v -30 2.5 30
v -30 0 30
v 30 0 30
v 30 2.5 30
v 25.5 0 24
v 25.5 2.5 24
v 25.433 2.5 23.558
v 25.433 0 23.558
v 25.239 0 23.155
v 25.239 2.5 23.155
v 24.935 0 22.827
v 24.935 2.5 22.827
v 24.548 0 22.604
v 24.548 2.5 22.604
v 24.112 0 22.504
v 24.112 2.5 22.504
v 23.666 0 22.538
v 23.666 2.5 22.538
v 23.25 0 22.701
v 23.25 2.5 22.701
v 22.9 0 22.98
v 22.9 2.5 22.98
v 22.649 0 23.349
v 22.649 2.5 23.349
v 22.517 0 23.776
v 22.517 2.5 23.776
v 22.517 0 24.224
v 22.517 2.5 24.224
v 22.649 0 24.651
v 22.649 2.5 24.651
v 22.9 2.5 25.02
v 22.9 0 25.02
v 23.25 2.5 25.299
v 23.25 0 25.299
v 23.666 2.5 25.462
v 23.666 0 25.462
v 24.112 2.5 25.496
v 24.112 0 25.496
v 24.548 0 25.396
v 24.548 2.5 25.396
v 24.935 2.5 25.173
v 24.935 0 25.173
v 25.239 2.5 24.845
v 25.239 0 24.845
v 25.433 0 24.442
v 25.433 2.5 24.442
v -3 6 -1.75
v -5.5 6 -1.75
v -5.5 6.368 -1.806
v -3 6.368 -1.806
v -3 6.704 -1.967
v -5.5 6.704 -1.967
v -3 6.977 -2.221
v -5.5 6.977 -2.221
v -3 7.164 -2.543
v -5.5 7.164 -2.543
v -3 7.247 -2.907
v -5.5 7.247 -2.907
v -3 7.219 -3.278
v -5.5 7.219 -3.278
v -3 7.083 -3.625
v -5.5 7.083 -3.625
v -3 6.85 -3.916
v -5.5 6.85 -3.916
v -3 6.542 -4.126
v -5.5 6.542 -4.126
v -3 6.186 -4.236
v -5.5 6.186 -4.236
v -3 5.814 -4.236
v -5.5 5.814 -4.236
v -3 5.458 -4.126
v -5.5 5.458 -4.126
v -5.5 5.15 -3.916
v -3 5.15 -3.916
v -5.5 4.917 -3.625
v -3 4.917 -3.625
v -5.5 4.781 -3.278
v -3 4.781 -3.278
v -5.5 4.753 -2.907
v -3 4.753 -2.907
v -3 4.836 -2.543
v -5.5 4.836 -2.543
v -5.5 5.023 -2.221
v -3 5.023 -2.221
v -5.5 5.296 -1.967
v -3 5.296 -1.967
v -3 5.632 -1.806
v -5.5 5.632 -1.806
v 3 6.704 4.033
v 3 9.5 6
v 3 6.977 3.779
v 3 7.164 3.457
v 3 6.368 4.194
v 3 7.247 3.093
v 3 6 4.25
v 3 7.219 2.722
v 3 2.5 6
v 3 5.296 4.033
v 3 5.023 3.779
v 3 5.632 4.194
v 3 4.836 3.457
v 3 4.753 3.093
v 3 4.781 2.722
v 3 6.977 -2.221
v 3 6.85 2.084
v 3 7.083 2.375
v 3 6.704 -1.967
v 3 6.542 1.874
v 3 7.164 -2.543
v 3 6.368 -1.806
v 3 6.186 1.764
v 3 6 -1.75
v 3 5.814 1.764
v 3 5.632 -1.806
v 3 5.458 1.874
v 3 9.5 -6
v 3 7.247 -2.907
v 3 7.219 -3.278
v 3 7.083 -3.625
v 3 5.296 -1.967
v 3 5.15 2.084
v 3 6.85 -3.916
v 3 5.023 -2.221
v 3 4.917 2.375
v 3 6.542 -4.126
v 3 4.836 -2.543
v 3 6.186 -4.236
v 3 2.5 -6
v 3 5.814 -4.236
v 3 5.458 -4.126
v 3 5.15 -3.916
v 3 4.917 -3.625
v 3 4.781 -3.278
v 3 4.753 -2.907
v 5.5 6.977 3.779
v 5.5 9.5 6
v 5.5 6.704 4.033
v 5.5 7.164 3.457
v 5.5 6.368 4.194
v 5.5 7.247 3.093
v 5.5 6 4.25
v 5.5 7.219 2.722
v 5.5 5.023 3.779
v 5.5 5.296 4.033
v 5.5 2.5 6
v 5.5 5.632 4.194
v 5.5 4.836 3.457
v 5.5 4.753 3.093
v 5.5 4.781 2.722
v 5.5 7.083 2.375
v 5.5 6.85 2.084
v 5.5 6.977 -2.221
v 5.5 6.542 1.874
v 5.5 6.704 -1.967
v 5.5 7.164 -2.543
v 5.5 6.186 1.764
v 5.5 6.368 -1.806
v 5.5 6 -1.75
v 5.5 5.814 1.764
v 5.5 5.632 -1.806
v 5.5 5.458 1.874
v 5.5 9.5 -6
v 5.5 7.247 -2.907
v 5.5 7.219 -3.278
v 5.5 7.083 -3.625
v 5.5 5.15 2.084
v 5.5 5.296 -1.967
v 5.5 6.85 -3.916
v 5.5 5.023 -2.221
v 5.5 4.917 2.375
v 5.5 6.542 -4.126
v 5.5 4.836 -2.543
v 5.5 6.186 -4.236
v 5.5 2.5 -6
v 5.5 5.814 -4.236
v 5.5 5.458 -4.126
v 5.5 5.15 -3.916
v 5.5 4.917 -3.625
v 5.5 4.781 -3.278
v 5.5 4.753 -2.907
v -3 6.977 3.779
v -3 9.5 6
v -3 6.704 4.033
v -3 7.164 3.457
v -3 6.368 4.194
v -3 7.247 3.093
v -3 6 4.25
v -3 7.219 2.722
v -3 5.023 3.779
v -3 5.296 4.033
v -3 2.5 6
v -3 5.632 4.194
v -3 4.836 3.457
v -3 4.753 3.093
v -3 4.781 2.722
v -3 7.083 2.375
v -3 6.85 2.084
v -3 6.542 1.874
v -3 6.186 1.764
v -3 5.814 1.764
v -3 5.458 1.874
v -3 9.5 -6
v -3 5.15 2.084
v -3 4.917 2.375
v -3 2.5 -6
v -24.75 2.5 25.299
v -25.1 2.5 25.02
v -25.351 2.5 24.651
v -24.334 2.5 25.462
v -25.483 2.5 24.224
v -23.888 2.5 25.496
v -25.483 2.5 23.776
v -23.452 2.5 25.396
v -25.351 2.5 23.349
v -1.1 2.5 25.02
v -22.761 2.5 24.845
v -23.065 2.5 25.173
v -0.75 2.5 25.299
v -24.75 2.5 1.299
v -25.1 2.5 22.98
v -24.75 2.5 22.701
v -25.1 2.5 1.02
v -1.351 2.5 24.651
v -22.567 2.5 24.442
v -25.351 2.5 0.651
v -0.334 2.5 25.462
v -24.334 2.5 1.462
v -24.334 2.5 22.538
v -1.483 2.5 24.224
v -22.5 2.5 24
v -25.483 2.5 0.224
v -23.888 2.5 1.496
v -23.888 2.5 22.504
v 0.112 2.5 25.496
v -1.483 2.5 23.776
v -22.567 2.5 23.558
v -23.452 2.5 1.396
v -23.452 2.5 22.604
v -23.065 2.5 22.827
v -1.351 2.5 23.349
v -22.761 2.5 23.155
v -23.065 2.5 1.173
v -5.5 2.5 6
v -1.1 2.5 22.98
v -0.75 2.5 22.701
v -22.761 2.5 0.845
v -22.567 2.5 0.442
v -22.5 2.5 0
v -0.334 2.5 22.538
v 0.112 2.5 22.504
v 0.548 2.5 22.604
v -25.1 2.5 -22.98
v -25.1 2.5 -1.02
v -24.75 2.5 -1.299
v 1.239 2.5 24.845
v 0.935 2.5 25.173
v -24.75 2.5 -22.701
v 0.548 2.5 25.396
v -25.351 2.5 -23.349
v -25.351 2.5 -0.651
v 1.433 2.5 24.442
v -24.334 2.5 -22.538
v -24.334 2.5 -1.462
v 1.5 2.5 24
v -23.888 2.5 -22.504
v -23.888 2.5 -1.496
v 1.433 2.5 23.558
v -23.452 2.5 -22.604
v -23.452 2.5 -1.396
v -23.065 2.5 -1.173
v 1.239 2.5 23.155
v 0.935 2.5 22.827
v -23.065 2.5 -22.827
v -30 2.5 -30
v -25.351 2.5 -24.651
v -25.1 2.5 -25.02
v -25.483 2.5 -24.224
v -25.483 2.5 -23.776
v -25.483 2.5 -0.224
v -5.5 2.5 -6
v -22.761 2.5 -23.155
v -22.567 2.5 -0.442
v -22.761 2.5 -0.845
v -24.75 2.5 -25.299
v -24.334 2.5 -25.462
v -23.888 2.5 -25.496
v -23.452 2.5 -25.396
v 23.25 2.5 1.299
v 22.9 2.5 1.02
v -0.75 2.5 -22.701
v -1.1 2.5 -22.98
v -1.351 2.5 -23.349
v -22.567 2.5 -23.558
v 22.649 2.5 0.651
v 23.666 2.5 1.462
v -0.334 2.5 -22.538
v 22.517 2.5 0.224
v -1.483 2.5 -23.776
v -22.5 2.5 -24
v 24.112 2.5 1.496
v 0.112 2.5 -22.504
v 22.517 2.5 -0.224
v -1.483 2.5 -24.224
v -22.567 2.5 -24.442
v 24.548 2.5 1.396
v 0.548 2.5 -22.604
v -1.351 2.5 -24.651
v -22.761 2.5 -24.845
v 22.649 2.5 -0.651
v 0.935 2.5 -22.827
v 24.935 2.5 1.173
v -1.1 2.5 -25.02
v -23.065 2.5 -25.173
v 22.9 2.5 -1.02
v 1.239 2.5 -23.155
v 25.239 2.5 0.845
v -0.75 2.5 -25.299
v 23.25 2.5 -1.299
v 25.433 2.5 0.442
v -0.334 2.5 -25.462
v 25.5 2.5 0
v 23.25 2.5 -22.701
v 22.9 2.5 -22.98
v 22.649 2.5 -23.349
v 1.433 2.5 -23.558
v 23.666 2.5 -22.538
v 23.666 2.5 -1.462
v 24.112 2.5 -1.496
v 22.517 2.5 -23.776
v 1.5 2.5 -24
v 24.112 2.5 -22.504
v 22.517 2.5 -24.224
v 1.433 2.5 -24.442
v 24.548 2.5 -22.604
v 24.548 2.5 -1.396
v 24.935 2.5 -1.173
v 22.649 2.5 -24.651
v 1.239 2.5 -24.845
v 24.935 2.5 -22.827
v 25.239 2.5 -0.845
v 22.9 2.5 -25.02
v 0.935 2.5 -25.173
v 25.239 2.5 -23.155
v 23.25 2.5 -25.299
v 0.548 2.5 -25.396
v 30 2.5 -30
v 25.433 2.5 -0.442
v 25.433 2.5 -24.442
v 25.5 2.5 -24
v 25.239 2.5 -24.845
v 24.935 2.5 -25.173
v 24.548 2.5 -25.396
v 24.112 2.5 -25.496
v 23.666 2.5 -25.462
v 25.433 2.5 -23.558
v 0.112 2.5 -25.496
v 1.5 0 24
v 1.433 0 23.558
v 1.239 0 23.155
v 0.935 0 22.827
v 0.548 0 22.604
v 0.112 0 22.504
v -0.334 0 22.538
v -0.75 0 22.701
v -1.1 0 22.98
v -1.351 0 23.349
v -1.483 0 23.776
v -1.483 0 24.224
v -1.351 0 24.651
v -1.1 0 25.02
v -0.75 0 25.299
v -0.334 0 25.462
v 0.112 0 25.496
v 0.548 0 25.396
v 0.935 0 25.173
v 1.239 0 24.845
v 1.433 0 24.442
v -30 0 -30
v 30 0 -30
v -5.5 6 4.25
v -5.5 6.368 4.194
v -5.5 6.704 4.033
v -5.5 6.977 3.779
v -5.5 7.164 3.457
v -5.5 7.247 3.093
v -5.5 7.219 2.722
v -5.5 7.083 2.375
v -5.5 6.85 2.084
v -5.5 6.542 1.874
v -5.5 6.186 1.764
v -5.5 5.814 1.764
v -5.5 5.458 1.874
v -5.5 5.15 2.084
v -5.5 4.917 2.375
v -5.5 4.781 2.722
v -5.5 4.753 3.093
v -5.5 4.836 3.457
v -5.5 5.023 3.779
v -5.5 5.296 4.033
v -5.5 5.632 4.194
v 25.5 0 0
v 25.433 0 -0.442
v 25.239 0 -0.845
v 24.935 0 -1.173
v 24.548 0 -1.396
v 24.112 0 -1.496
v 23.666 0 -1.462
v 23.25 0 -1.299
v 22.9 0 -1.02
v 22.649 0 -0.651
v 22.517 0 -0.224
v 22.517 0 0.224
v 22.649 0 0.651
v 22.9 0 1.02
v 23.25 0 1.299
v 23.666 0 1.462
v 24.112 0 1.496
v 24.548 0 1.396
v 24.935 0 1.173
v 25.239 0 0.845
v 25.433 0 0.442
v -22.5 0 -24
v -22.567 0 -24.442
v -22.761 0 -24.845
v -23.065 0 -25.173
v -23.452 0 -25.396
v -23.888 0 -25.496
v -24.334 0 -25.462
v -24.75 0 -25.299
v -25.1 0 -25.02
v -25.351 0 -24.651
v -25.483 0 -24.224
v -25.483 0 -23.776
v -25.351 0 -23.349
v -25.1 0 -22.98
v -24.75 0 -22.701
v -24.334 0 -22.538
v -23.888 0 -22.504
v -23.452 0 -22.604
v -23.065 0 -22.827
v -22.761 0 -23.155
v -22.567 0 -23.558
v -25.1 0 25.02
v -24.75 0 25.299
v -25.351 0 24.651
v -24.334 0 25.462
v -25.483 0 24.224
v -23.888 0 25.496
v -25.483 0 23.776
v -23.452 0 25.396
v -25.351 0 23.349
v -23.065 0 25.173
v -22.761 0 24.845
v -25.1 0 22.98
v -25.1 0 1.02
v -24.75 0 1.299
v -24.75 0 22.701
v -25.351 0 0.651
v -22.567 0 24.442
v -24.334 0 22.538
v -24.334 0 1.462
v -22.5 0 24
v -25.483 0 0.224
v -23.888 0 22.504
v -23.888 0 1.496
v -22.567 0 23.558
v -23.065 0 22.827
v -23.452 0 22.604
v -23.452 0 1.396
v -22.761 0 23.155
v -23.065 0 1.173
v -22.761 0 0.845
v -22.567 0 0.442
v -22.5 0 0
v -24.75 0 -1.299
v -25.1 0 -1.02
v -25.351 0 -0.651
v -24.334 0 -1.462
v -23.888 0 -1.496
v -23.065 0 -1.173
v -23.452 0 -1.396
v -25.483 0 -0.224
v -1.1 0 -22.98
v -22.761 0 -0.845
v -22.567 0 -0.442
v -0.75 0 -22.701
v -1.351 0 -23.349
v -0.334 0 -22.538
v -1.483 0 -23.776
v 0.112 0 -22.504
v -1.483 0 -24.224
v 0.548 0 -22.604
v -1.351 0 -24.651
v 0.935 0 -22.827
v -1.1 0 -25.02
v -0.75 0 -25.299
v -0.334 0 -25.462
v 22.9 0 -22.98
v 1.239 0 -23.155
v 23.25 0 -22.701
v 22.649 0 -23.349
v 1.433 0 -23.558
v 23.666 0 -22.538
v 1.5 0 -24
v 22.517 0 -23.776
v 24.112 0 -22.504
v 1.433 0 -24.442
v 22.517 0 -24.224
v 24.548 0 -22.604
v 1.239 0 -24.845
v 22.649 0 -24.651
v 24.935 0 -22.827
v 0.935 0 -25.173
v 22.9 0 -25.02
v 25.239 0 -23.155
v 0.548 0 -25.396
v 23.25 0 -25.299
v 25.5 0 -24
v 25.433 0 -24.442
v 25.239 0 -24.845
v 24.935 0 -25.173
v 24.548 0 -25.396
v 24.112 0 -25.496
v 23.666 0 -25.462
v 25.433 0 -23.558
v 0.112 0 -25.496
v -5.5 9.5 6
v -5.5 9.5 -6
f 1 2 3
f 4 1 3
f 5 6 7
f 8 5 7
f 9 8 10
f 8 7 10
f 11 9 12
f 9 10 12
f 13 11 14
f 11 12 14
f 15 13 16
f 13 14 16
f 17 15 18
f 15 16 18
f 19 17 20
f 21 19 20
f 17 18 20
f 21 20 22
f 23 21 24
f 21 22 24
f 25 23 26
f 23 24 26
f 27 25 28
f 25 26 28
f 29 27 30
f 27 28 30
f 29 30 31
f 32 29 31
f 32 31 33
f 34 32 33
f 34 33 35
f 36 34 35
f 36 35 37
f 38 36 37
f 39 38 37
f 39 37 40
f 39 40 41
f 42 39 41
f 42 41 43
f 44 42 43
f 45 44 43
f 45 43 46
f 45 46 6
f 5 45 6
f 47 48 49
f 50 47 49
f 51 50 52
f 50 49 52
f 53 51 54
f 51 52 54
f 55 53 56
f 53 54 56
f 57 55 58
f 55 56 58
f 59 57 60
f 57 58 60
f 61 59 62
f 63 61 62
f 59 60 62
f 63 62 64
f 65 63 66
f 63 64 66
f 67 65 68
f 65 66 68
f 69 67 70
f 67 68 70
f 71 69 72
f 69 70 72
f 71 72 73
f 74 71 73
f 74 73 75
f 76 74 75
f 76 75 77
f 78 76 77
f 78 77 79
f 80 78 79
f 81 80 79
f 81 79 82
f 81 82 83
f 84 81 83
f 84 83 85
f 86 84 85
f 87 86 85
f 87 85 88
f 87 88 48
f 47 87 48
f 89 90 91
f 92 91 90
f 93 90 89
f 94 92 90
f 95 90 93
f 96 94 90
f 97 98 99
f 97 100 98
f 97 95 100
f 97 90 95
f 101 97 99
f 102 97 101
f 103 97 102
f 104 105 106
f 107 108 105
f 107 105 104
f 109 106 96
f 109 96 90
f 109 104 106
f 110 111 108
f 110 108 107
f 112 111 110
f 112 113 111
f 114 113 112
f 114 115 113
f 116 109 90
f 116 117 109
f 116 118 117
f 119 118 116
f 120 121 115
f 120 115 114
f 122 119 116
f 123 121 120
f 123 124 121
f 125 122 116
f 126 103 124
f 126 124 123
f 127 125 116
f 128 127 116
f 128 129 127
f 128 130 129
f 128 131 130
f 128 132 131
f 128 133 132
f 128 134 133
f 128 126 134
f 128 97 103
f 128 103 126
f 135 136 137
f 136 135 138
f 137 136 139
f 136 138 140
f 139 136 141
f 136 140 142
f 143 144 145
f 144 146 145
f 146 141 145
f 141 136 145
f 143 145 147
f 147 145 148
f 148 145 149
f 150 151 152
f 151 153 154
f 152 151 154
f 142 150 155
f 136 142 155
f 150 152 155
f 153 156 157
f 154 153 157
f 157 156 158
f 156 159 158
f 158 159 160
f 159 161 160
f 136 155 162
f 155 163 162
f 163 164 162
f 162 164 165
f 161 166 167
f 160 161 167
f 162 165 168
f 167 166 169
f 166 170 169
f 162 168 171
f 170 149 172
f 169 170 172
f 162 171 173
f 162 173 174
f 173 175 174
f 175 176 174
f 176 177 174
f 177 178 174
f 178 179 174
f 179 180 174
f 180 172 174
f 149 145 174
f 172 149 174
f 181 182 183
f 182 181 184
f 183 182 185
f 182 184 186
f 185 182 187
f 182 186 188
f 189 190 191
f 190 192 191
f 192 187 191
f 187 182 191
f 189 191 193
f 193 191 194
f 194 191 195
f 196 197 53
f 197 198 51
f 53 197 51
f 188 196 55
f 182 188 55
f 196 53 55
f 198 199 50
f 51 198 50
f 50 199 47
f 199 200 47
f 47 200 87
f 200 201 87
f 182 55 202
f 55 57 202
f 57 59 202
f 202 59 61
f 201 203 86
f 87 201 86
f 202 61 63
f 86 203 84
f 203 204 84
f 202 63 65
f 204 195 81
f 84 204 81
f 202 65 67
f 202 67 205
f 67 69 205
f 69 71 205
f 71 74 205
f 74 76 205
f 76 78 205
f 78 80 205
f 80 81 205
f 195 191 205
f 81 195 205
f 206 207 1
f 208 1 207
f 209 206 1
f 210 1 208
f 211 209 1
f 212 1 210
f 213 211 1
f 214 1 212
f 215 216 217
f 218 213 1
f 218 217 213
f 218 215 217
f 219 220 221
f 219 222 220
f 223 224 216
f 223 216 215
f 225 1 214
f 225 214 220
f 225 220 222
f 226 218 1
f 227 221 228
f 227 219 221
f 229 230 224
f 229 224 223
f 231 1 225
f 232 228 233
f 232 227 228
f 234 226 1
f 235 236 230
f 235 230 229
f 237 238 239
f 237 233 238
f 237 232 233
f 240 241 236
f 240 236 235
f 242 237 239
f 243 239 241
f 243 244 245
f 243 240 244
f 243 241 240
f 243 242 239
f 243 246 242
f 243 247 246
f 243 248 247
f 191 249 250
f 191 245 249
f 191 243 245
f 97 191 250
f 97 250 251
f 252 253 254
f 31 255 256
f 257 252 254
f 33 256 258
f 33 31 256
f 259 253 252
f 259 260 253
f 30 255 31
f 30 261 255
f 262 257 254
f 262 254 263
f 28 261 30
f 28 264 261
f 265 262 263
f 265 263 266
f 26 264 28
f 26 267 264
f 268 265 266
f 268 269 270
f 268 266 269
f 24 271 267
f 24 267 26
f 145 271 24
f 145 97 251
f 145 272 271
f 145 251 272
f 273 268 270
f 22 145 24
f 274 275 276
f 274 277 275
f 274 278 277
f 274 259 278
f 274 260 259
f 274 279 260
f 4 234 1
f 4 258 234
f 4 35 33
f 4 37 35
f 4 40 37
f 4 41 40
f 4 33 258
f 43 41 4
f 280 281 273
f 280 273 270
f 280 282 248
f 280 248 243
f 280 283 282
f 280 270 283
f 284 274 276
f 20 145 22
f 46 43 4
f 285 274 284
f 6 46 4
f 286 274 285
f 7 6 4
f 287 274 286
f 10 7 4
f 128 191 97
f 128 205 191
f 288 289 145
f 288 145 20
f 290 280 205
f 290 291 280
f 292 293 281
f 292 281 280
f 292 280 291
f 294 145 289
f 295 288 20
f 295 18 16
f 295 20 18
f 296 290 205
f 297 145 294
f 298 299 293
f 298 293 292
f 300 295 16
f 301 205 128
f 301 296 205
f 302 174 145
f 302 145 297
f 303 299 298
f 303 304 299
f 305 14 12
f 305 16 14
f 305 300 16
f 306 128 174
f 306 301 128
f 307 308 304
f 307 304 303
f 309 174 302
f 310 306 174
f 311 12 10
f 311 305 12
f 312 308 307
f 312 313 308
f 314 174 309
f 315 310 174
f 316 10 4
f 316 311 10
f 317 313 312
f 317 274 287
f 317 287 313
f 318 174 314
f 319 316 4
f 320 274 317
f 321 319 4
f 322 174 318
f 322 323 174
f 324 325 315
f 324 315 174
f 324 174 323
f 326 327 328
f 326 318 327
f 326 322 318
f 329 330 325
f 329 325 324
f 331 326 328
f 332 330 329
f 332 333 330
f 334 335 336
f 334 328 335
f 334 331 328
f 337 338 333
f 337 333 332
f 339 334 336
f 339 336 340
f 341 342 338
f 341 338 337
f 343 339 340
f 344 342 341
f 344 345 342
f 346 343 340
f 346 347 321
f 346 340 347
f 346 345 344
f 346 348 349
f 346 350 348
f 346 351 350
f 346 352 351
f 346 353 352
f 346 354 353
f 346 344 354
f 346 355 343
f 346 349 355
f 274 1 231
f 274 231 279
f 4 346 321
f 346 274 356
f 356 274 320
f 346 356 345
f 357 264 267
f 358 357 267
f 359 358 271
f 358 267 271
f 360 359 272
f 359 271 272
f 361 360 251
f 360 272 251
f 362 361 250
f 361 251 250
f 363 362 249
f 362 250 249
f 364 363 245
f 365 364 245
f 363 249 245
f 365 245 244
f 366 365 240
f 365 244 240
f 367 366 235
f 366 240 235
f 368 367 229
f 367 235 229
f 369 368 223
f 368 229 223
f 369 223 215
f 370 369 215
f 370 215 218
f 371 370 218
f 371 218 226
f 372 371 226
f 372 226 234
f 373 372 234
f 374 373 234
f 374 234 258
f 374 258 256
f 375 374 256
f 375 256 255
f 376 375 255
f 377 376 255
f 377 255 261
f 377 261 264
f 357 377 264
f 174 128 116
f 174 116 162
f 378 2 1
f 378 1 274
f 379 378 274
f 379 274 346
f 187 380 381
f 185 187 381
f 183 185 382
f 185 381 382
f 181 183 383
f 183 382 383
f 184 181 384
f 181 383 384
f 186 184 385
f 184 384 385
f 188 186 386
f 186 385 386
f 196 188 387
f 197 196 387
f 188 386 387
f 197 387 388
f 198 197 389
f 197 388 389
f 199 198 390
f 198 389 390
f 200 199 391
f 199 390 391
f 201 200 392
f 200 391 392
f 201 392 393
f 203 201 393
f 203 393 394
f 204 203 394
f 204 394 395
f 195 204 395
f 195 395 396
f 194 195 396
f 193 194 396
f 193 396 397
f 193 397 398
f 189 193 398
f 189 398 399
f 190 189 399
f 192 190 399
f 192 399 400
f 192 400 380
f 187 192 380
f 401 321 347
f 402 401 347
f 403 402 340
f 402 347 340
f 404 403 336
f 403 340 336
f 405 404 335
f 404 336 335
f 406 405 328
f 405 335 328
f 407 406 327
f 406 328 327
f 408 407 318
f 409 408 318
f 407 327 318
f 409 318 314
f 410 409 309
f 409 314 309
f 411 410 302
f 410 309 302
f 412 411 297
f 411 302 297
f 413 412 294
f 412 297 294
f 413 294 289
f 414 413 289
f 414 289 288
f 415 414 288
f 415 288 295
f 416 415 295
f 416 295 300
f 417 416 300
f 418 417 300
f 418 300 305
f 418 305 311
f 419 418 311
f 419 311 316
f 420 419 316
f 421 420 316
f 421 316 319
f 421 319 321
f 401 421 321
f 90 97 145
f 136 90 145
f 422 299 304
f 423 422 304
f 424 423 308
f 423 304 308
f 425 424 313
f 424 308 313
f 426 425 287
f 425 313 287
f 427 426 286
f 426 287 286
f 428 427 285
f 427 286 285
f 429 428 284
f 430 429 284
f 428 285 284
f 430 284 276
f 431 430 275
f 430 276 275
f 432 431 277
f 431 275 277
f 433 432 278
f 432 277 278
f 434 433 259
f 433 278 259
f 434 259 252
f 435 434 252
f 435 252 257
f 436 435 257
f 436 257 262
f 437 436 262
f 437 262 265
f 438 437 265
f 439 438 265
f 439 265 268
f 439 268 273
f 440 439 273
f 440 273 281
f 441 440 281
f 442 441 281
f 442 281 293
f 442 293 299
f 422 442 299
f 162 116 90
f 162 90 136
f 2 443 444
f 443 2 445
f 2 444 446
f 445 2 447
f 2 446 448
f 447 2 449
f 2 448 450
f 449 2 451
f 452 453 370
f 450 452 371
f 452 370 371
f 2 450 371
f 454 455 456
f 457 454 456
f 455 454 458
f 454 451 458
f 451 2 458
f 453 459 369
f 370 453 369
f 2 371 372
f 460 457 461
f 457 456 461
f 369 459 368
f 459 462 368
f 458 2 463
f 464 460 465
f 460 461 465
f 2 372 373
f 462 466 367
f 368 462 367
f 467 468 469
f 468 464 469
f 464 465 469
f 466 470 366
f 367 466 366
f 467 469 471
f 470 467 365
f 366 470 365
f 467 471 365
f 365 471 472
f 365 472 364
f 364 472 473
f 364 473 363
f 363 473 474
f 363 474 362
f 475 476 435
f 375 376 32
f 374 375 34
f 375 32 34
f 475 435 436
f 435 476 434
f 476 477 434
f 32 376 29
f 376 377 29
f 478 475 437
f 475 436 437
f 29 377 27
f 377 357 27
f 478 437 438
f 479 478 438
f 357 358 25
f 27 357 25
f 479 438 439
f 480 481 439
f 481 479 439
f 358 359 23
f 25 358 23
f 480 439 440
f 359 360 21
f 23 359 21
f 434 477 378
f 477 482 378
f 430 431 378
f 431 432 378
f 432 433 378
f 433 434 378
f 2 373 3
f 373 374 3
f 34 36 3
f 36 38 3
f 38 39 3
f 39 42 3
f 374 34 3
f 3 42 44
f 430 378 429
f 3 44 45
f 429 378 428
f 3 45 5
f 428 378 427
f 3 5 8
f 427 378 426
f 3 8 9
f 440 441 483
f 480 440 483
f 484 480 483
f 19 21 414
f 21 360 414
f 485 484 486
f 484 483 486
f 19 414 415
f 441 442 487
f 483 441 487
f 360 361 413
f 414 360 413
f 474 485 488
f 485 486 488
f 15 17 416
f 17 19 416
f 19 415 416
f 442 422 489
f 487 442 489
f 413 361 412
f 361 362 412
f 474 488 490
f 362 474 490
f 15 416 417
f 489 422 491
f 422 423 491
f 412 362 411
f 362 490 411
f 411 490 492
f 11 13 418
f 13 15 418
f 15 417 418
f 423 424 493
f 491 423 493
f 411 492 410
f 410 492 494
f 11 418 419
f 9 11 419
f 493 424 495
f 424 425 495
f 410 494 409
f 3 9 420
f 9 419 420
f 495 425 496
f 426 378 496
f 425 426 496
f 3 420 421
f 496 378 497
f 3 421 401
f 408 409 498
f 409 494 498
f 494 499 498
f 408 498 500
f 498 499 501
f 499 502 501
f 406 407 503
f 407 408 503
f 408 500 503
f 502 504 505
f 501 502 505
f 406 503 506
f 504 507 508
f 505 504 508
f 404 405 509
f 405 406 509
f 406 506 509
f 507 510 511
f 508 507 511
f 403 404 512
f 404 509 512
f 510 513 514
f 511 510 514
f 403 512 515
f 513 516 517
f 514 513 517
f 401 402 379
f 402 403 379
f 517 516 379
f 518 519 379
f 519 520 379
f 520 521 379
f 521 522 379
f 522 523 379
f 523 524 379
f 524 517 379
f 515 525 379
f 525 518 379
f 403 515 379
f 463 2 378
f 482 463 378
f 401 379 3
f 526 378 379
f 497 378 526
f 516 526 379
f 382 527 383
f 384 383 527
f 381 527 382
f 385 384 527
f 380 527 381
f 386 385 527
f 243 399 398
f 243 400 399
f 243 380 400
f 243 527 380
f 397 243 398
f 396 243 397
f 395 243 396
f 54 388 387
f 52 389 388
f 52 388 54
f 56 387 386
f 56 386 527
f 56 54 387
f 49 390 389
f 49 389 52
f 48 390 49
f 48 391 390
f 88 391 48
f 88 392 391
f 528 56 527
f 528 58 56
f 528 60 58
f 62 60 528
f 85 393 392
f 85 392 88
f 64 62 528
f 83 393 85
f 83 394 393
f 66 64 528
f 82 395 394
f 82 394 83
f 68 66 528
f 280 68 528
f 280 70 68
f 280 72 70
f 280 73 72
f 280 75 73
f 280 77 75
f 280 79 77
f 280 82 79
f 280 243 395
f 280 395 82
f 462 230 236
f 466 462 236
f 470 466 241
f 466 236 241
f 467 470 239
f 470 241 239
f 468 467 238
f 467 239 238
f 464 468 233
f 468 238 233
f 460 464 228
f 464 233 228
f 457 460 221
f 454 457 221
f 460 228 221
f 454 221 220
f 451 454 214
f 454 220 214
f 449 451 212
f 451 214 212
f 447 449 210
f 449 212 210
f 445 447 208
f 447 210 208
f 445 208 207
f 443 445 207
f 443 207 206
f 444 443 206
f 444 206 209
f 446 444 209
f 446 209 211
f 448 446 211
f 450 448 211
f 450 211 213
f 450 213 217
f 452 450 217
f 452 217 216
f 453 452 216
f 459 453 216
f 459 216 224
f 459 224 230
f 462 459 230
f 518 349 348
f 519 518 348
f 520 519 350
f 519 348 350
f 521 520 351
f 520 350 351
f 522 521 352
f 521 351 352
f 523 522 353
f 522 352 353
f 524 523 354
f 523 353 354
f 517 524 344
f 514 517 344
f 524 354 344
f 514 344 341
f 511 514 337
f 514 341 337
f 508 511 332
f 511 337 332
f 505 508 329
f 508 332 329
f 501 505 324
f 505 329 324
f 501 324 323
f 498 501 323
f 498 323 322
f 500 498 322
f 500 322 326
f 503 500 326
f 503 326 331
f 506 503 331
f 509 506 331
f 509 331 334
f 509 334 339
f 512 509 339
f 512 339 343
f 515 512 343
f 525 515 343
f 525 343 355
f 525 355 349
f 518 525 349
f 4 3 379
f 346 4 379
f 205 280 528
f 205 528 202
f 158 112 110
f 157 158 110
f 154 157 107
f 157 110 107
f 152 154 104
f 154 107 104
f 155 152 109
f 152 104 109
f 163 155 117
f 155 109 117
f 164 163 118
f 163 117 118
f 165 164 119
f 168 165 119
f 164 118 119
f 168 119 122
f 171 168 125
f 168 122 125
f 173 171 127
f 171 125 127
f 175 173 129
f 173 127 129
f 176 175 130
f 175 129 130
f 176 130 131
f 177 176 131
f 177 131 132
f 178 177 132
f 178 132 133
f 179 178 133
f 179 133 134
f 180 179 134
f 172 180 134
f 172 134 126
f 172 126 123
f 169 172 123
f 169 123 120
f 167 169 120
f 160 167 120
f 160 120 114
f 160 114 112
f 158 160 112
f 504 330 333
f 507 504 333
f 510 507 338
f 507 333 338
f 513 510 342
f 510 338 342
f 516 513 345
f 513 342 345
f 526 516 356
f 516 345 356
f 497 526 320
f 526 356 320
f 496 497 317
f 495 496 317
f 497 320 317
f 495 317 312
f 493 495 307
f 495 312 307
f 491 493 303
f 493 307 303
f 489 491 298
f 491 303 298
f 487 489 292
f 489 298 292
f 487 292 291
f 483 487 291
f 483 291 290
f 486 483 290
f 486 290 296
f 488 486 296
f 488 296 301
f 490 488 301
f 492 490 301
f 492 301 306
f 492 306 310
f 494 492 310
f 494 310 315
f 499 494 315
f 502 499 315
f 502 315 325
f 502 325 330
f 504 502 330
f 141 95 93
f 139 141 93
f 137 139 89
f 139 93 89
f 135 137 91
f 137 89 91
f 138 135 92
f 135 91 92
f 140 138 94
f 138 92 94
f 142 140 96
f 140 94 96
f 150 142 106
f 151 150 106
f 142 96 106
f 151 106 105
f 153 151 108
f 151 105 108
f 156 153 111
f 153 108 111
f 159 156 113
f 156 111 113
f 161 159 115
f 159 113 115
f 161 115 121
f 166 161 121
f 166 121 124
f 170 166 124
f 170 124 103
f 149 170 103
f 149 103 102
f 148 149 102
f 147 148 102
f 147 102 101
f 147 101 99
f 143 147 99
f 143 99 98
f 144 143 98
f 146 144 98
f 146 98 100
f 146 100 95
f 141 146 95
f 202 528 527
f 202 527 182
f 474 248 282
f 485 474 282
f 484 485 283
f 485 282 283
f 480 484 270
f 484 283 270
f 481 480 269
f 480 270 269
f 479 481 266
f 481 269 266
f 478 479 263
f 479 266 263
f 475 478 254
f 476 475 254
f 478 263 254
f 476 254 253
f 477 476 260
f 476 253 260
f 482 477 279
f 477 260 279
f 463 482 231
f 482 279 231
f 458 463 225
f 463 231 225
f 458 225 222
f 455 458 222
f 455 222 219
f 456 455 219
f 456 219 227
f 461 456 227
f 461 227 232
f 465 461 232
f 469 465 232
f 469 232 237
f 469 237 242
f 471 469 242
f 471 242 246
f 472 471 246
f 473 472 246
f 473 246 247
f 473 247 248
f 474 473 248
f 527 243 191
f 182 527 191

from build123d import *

# Parameters (mm, degrees)
SKETCH2_W           = 60
SKETCH2_H           = 60
BOSS_EXTRUDE1_DEPTH = 2.5
SKETCH3_W           = 2.5
SKETCH3_H           = 12
BOSS_EXTRUDE3_DEPTH = 7
SKETCH6_R           = 1.25
CUT_EXTRUDE1_DEPTH  = 11
CUT_EXTRUDE2_REACH  = 4.5
SKETCH7_R           = 1.5


with BuildPart() as part:
    # Sketch2 → Boss-Extrude1 (new body)
    with BuildSketch(Plane(origin=(0, 0, 0), x_dir=(1, 0, 0), z_dir=(0, 1, 0))):
        Rectangle(SKETCH2_W, SKETCH2_H)
    extrude(amount=BOSS_EXTRUDE1_DEPTH)

    # Sketch3 → Boss-Extrude3 (add)
    with BuildSketch(Plane(origin=(0, 2.5, 0), x_dir=(1, 0, 0), z_dir=(0, 1, 0))):
        with Locations((-4.25, 0)):
            Rectangle(SKETCH3_W, SKETCH3_H)
        with Locations((4.25, 0)):
            Rectangle(SKETCH3_W, SKETCH3_H)
    extrude(amount=BOSS_EXTRUDE3_DEPTH)

    # Sketch6 → Cut-Extrude1 (cut)
    with BuildSketch(Plane.ZY.offset(5.5)):
        with Locations((-3, 6)):
            Circle(SKETCH6_R)
        with Locations((3, 6)):
            Circle(SKETCH6_R)
    extrude(amount=-CUT_EXTRUDE1_DEPTH, mode=Mode.SUBTRACT)

    # Sketch7 → Cut-Extrude2 (cut, up to next)
    with BuildSketch(Plane(origin=(0, 2.5, 0), x_dir=(1, 0, 0), z_dir=(0, 1, 0)), mode=Mode.PRIVATE) as cut_extrude2_sk1:
        with Locations((24, -24)):
            Circle(SKETCH7_R)
    cut_extrude2_tool1 = extrude(cut_extrude2_sk1.sketch, amount=-CUT_EXTRUDE2_REACH, mode=Mode.PRIVATE) & part.part
    add(cut_extrude2_tool1.solids().sort_by_distance((24, 2.5, 24))[0], mode=Mode.SUBTRACT)
    # Sketch7 → Cut-Extrude2 (cut, up to next)
    with BuildSketch(Plane(origin=(0, 2.5, 0), x_dir=(1, 0, 0), z_dir=(0, 1, 0)), mode=Mode.PRIVATE) as cut_extrude2_sk2:
        with Locations((-24, -24)):
            Circle(SKETCH7_R)
    cut_extrude2_tool2 = extrude(cut_extrude2_sk2.sketch, amount=-CUT_EXTRUDE2_REACH, mode=Mode.PRIVATE) & part.part
    add(cut_extrude2_tool2.solids().sort_by_distance((-24, 2.5, 24))[0], mode=Mode.SUBTRACT)
    # Sketch7 → Cut-Extrude2 (cut, up to next)
    with BuildSketch(Plane(origin=(0, 2.5, 0), x_dir=(1, 0, 0), z_dir=(0, 1, 0)), mode=Mode.PRIVATE) as cut_extrude2_sk3:
        with Locations((-24, 24)):
            Circle(SKETCH7_R)
    cut_extrude2_tool3 = extrude(cut_extrude2_sk3.sketch, amount=-CUT_EXTRUDE2_REACH, mode=Mode.PRIVATE) & part.part
    add(cut_extrude2_tool3.solids().sort_by_distance((-24, 2.5, -24))[0], mode=Mode.SUBTRACT)
    # Sketch7 → Cut-Extrude2 (cut, up to next)
    with BuildSketch(Plane(origin=(0, 2.5, 0), x_dir=(1, 0, 0), z_dir=(0, 1, 0)), mode=Mode.PRIVATE) as cut_extrude2_sk4:
        with Locations((24, 24)):
            Circle(SKETCH7_R)
    cut_extrude2_tool4 = extrude(cut_extrude2_sk4.sketch, amount=-CUT_EXTRUDE2_REACH, mode=Mode.PRIVATE) & part.part
    add(cut_extrude2_tool4.solids().sort_by_distance((24, 2.5, -24))[0], mode=Mode.SUBTRACT)
    # Sketch7 → Cut-Extrude2 (cut, up to next)
    with BuildSketch(Plane(origin=(0, 2.5, 0), x_dir=(1, 0, 0), z_dir=(0, 1, 0)), mode=Mode.PRIVATE) as cut_extrude2_sk5:
        with Locations((24, 0)):
            Circle(SKETCH7_R)
    cut_extrude2_tool5 = extrude(cut_extrude2_sk5.sketch, amount=-CUT_EXTRUDE2_REACH, mode=Mode.PRIVATE) & part.part
    add(cut_extrude2_tool5.solids().sort_by_distance((24, 2.5, 0))[0], mode=Mode.SUBTRACT)
    # Sketch7 → Cut-Extrude2 (cut, up to next)
    with BuildSketch(Plane(origin=(0, 2.5, 0), x_dir=(1, 0, 0), z_dir=(0, 1, 0)), mode=Mode.PRIVATE) as cut_extrude2_sk6:
        with Locations((-24, 0)):
            Circle(SKETCH7_R)
    cut_extrude2_tool6 = extrude(cut_extrude2_sk6.sketch, amount=-CUT_EXTRUDE2_REACH, mode=Mode.PRIVATE) & part.part
    add(cut_extrude2_tool6.solids().sort_by_distance((-24, 2.5, 0))[0], mode=Mode.SUBTRACT)
    # Sketch7 → Cut-Extrude2 (cut, up to next)
    with BuildSketch(Plane(origin=(0, 2.5, 0), x_dir=(1, 0, 0), z_dir=(0, 1, 0)), mode=Mode.PRIVATE) as cut_extrude2_sk7:
        with Locations((0, -24)):
            Circle(SKETCH7_R)
    cut_extrude2_tool7 = extrude(cut_extrude2_sk7.sketch, amount=-CUT_EXTRUDE2_REACH, mode=Mode.PRIVATE) & part.part
    add(cut_extrude2_tool7.solids().sort_by_distance((0, 2.5, 24))[0], mode=Mode.SUBTRACT)
    # Sketch7 → Cut-Extrude2 (cut, up to next)
    with BuildSketch(Plane(origin=(0, 2.5, 0), x_dir=(1, 0, 0), z_dir=(0, 1, 0)), mode=Mode.PRIVATE) as cut_extrude2_sk8:
        with Locations((0, 24)):
            Circle(SKETCH7_R)
    cut_extrude2_tool8 = extrude(cut_extrude2_sk8.sketch, amount=-CUT_EXTRUDE2_REACH, mode=Mode.PRIVATE) & part.part
    add(cut_extrude2_tool8.solids().sort_by_distance((0, 2.5, -24))[0], mode=Mode.SUBTRACT)


solid = part.part
